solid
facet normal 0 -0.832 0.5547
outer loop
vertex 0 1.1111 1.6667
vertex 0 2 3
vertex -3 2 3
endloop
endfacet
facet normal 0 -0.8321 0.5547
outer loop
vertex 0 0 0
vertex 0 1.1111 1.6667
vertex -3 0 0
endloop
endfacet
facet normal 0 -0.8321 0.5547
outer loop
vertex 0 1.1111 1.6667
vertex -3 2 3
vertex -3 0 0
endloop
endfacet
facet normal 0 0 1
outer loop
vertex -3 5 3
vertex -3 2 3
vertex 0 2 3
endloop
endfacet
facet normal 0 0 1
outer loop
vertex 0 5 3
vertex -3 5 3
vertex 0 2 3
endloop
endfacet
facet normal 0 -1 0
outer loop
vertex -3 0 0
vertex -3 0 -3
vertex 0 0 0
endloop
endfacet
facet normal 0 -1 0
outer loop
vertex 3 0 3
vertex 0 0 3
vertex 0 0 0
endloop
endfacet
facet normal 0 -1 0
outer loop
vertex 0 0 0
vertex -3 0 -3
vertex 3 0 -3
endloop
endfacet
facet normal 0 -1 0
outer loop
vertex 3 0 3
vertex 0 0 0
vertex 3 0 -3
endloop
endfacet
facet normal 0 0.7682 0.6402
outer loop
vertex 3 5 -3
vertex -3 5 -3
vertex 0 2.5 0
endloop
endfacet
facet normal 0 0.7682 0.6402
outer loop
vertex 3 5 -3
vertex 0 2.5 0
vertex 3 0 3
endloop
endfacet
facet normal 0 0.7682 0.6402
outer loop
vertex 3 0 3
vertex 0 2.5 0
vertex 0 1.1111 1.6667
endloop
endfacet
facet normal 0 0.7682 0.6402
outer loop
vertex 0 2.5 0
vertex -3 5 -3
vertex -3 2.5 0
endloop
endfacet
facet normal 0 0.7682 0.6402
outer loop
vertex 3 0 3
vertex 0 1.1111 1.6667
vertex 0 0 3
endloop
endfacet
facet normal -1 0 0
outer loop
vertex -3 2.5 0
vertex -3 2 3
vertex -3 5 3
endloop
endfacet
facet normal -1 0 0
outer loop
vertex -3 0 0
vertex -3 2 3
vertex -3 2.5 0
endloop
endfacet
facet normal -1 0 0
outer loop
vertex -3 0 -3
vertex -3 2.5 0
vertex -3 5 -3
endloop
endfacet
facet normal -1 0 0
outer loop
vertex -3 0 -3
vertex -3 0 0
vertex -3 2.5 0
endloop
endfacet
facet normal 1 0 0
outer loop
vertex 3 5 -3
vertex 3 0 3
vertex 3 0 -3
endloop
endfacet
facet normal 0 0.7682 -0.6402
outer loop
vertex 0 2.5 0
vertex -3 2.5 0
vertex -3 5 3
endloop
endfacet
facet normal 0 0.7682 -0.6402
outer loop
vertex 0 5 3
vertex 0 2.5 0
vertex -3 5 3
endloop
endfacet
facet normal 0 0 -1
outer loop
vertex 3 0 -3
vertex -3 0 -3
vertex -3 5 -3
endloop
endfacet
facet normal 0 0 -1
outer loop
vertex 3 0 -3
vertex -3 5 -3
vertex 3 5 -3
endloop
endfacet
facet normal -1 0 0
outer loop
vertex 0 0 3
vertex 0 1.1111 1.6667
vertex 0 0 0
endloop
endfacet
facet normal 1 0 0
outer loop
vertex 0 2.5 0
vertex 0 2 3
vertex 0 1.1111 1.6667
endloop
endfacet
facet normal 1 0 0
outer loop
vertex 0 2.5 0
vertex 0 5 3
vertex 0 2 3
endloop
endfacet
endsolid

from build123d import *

# Parameters (mm, degrees)
SKETCH1_W           = 6
SKETCH1_H           = 6
BOSS_EXTRUDE1_DEPTH = 5
CUT_EXTRUDE1_DEPTH  = 10
CUT_EXTRUDE2_DEPTH  = 3
CUT_EXTRUDE3_DEPTH  = 3


with BuildPart() as part:
    # Sketch1 → Boss-Extrude1 (new body)
    with BuildSketch(Plane(origin=(0, 0, 0), x_dir=(1, 0, 0), z_dir=(0, 1, 0))):
        Rectangle(SKETCH1_W, SKETCH1_H)
    extrude(amount=BOSS_EXTRUDE1_DEPTH)

    # Sketch2 → Cut-Extrude1 (cut)
    with BuildSketch(Plane.ZY.offset(3)):
        Polygon((3, 5), (-3, 5), (0, 2.5), align=None)
    extrude(amount=-CUT_EXTRUDE1_DEPTH, mode=Mode.SUBTRACT)

    # Sketch3 → Cut-Extrude2 (cut)
    with BuildSketch(Plane(origin=(3, 0, 0), x_dir=(0, 0, -1), z_dir=(1, 0, 0))):
        Polygon((-3, 0), (0, 2.5), (-3, 5), align=None)
    extrude(amount=-CUT_EXTRUDE2_DEPTH, mode=Mode.SUBTRACT)

    # Sketch4 → Cut-Extrude3 (cut)
    with BuildSketch(Plane.ZY.offset(3)):
        Polygon((0, 0), (3, 0), (3, 2), align=None)
    extrude(amount=-CUT_EXTRUDE3_DEPTH, mode=Mode.SUBTRACT)


solid = part.part
